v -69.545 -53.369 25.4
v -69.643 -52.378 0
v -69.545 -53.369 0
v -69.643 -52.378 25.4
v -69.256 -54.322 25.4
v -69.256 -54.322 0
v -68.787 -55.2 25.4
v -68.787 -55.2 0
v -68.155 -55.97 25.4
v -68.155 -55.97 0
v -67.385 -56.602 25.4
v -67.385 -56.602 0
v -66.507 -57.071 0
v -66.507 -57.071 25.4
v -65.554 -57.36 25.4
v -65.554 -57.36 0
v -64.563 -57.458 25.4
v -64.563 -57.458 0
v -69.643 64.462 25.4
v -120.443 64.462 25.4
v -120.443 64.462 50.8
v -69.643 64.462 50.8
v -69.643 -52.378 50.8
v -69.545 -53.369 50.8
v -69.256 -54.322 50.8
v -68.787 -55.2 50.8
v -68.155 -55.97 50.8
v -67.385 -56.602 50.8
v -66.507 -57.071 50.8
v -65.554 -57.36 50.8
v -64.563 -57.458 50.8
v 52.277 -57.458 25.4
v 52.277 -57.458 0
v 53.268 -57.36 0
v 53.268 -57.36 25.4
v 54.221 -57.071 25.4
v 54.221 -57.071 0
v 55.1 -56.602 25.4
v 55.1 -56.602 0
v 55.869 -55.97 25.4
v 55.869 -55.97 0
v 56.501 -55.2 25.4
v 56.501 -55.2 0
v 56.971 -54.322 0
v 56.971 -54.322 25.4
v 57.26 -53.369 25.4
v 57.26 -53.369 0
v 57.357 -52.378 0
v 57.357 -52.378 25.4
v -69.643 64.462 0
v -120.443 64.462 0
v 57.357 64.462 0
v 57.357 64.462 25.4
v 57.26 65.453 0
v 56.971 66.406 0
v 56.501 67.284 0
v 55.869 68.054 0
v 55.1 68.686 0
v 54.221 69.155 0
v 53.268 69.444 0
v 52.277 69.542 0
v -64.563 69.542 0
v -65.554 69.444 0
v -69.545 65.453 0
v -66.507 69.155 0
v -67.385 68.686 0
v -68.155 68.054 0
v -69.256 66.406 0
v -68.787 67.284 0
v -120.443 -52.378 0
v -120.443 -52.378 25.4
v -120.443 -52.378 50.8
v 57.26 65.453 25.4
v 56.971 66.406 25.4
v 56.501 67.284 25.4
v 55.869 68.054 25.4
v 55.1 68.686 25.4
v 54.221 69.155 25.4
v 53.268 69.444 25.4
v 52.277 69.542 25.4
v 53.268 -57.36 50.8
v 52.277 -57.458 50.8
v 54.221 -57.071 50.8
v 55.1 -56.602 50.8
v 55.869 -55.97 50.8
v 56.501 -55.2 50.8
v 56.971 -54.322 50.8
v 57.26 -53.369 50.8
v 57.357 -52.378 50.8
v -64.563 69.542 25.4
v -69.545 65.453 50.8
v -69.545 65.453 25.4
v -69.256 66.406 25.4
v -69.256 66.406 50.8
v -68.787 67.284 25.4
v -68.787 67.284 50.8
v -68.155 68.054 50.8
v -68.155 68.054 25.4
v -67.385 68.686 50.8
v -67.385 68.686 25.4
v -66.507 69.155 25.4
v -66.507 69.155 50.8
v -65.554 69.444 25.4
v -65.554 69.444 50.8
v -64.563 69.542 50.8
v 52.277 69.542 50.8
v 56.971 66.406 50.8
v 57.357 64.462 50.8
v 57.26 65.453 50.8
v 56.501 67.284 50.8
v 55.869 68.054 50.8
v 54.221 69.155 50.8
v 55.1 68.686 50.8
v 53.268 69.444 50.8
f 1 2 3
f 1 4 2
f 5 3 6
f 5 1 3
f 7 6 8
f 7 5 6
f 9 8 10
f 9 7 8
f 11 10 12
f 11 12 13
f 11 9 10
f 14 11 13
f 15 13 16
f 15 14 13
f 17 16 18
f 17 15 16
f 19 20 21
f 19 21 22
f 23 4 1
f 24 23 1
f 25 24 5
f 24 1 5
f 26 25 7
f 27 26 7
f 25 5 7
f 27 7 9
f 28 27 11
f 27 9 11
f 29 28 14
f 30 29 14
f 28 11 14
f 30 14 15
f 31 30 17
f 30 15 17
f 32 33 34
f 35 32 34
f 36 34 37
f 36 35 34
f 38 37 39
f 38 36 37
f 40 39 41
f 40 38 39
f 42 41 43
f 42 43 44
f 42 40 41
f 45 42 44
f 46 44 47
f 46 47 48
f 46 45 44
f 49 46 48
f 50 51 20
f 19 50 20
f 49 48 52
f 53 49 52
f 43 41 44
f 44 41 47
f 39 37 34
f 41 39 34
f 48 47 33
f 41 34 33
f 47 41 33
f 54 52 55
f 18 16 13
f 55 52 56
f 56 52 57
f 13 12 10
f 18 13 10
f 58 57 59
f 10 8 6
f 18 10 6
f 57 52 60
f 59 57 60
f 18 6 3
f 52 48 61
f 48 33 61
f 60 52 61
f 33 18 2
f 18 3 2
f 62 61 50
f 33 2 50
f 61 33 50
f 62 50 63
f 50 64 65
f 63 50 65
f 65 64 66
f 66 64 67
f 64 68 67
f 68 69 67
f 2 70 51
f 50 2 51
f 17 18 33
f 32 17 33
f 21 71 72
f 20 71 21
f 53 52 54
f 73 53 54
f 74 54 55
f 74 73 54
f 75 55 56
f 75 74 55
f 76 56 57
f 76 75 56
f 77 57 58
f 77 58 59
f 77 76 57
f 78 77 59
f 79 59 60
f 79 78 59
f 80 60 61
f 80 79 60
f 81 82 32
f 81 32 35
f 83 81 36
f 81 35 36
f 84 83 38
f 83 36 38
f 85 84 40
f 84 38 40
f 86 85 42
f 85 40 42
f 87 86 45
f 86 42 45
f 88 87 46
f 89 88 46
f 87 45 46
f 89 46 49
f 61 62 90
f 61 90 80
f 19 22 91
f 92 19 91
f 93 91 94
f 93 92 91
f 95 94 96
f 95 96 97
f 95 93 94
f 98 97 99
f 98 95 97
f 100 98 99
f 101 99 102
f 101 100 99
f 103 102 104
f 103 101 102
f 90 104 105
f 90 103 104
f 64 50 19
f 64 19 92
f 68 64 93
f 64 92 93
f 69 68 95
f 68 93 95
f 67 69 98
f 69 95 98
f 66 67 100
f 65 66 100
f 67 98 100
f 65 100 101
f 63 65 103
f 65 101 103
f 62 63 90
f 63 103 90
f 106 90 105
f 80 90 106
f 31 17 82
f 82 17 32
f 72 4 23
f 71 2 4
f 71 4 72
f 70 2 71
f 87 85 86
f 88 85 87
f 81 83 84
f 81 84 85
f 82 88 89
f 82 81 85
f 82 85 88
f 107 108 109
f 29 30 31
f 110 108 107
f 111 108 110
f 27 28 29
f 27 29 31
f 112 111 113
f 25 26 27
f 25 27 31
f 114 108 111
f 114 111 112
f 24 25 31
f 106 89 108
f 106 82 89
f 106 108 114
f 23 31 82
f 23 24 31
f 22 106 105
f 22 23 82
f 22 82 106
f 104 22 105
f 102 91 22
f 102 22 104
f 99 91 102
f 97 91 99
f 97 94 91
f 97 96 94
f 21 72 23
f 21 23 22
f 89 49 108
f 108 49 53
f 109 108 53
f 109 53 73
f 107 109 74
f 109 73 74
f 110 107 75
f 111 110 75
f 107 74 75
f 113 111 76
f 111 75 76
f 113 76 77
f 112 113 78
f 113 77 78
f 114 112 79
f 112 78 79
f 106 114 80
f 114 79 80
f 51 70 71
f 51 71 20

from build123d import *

# Parameters (mm, degrees)
F0_W     = 127
F0_H     = 127
F1_DEPTH = 25.4
F2_R     = 5.08
F3_DEPTH = 25.4
F4_DEPTH = 25.4
F5_DEPTH = 25.399999693
F6_DEPTH = 25.4


with BuildPart() as f1:
    # F0 (on Top) → F1 (new body)
    with BuildSketch(Plane.XY):
        with Locations((-6.1427538668, 6.0419291258)):
            Rectangle(F0_W, F0_H)
    extrude(amount=F1_DEPTH)

    # F2
    f2_edges = [f1.edges().sort_by_distance(p)[0] for p in [
        (57.357246, -57.458071, 12.7),
        (57.357246, 69.541929, 12.7),
        (-69.642754, -57.458071, 12.7),
        (-69.642754, 69.541929, 12.7),
    ]]
    fillet(f2_edges, radius=F2_R)

    # F3 (add): a face of the model
    f3_faces = [f1.faces().sort_by_distance(p)[0] for p in [
        (-69.6427538668, 6.0419291258, 12.7),
    ]]
    extrude(f3_faces, amount=F3_DEPTH)

    # F4 (add): a face of the model
    f4_faces = [f1.faces().sort_by_distance(p)[0] for p in [
        (-95.0427538668, 6.0419291258, 12.7),
    ]]
    extrude(f4_faces, amount=F4_DEPTH)

    # F5 (add): a face of the model
    f5_faces = [f1.faces().sort_by_distance(p)[0] for p in [
        (-120.4427538668, 6.0419291258, 12.7),
    ]]
    extrude(f5_faces, amount=-F5_DEPTH)

    # F6 (add): a face of the model
    f6_faces = [f1.faces().sort_by_distance(p)[0] for p in [
        (-30.0814078041, 6.0419291258, 25.4),
    ]]
    extrude(f6_faces, amount=F6_DEPTH)


solid = f1.part
